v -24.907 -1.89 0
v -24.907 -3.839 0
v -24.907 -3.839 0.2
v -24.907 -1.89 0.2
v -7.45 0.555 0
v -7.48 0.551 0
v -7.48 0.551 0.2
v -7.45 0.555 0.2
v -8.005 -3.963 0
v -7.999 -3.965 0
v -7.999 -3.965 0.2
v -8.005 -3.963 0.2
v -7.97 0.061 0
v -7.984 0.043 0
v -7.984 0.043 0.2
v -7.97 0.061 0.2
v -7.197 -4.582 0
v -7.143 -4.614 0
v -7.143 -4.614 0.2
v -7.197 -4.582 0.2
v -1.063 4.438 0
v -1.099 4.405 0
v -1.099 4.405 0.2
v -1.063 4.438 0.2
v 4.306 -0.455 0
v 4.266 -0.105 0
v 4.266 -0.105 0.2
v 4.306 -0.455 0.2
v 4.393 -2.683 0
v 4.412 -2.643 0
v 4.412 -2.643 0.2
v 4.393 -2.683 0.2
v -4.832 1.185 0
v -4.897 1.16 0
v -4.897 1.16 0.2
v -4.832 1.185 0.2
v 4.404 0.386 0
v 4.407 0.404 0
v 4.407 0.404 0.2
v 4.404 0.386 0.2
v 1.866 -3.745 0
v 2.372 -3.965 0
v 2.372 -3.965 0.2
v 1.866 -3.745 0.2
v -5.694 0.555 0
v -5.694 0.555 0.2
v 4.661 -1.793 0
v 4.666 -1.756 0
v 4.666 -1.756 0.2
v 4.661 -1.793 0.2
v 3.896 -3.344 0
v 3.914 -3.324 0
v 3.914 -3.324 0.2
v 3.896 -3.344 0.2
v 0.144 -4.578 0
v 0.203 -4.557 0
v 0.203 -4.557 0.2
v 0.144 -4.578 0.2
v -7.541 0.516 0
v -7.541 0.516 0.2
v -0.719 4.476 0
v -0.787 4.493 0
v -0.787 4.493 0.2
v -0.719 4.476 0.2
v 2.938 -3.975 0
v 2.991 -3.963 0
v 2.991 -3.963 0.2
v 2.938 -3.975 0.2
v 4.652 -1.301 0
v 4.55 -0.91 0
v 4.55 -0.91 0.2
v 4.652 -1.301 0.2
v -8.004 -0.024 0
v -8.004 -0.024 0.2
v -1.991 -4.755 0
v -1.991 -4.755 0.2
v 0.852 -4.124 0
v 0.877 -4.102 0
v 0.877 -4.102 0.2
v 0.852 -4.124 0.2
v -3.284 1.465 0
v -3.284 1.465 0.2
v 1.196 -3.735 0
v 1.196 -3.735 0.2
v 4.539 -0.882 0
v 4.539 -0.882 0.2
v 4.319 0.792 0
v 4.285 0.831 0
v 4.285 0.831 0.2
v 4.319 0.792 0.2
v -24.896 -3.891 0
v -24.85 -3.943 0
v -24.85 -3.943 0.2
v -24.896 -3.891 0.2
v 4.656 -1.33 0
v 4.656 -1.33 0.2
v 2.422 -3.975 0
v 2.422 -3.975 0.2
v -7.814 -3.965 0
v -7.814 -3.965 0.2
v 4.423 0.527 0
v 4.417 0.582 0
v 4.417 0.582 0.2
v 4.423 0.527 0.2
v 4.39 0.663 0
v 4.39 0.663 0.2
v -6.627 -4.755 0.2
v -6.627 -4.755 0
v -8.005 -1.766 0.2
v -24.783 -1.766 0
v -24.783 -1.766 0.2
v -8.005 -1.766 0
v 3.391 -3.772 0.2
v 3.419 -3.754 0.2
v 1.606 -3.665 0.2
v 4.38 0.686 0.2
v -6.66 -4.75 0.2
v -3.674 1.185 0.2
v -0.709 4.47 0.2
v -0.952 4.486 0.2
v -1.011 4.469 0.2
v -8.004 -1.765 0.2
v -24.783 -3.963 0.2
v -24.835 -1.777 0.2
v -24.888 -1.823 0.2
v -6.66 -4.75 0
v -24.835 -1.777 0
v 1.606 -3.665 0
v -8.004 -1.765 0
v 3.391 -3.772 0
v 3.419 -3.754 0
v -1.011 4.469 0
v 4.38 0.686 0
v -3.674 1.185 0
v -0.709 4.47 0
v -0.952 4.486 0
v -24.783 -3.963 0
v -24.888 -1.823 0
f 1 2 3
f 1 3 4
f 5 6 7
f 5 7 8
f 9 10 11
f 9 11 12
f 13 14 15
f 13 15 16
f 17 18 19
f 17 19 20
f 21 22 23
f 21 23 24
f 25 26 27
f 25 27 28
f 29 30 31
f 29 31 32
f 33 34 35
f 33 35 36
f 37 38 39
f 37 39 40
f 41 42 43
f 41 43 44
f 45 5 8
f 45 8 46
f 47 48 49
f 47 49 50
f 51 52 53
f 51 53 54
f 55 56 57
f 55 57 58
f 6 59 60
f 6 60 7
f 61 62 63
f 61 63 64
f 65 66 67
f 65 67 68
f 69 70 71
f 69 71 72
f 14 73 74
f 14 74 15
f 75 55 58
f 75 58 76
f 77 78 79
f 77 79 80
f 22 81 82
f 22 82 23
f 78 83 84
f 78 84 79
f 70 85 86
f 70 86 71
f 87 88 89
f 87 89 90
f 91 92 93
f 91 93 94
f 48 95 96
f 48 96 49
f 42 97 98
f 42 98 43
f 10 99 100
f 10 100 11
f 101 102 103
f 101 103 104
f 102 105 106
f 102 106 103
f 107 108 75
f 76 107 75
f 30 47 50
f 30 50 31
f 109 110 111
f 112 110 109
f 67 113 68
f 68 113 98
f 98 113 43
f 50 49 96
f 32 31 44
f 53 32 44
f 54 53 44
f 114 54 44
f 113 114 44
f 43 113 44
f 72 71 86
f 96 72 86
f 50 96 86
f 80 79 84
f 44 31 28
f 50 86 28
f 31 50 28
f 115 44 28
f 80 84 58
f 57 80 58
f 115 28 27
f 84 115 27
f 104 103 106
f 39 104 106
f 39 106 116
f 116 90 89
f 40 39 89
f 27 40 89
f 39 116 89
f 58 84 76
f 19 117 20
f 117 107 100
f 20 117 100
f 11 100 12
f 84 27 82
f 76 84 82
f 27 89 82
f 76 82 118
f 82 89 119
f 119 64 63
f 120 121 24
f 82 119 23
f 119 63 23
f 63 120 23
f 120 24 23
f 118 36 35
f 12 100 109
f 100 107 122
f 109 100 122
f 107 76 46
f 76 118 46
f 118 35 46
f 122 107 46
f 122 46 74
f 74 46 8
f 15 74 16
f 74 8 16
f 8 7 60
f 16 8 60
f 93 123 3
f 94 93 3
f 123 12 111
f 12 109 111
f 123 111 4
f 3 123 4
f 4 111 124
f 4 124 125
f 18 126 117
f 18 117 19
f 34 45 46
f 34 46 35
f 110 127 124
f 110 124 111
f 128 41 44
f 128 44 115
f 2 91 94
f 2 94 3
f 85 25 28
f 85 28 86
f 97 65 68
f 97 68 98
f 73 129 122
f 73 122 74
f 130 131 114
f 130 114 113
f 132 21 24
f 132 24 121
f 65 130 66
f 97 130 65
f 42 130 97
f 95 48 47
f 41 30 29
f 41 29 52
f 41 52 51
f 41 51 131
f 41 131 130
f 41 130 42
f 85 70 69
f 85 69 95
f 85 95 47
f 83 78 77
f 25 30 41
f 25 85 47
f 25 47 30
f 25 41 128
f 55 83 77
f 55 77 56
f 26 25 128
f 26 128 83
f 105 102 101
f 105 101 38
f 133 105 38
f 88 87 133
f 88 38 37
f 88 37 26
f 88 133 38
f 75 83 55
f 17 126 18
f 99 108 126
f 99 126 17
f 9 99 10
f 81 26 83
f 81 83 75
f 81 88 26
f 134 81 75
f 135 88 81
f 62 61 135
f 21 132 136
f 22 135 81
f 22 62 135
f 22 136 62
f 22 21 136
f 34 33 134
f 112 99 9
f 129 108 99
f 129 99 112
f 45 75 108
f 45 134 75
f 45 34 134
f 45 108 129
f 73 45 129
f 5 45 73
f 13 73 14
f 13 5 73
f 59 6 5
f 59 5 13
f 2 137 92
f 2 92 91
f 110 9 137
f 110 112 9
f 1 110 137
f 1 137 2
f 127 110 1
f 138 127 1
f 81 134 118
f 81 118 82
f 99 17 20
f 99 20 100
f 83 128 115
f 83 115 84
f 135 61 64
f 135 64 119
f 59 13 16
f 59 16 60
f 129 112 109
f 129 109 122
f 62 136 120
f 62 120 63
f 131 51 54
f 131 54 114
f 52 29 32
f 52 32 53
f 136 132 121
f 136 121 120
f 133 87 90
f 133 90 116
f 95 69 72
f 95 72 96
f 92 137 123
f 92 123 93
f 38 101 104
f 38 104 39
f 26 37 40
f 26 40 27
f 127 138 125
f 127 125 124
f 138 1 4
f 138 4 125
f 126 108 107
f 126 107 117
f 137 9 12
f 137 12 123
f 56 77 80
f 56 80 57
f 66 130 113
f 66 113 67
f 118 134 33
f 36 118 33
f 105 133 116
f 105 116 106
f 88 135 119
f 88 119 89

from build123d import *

# Parameters (mm, degrees)
BOSS_EXTRUDE1_DEPTH   = 0.2
BOSS_EXTRUDE1_2_DEPTH = 0.2


with BuildPart() as part:
    # Model → Boss-Extrude1 (new body)
    with BuildSketch(Plane.XY):
        Polygon((-0.719000633, 4.476263641), (-0.709000633, 4.470263641), (4.284999367, 0.831263641), (4.318999367, 0.792263641), (4.379999367, 0.686263641), (4.389999367, 0.663263641), (4.416999367, 0.582263641), (4.422999367, 0.527263641), (4.406999367, 0.404263641), (4.403999367, 0.386263641), (4.265999367, -0.104736359), (4.305999367, -0.454736359), (4.538999367, -0.881736359), (4.549999367, -0.909736359), (4.651999367, -1.300736359), (4.655999367, -1.329736359), (4.665999367, -1.755736359), (4.660999367, -1.792736359), (4.411999367, -2.642736359), (4.392999367, -2.682736359), (3.913999367, -3.323736359), (3.895999367, -3.343736359), (3.418999367, -3.753736359), (3.390999367, -3.771736359), (2.990999367, -3.962736359), (2.937999367, -3.974736359), (2.421999367, -3.974736359), (2.371999367, -3.964736359), (1.865999367, -3.744736359), (1.605999367, -3.664736359), (1.195999367, -3.734736359), (0.876999367, -4.101736359), (0.851999367, -4.123736359), (0.202999367, -4.556736359), (0.143999367, -4.577736359), (-1.991000633, -4.754736359), (-1.997000633, -4.754736359), (-6.627000633, -4.754736359), (-6.660000633, -4.749736359), (-7.143000633, -4.613736359), (-7.197000633, -4.581736359), (-7.814000633, -3.964736359), (-7.999000633, -3.964736359), (-8.005000633, -3.962736359), (-24.783000633, -3.962736359), (-24.850000633, -3.942736359), (-24.896000633, -3.890736359), (-24.907000633, -3.838736359), (-24.907000633, -1.889736359), (-24.888000633, -1.822736359), (-24.835000633, -1.776736359), (-24.783000633, -1.765736359), (-8.005000633, -1.765736359), (-8.004000633, -1.764736359), (-8.004000633, -0.023736359), (-7.984000633, 0.043263641), (-7.970000633, 0.061263641), (-7.541000633, 0.516263641), (-7.480000633, 0.551263641), (-7.450000633, 0.555263641), (-5.694000633, 0.555263641), (-4.897000633, 1.160263641), (-4.832000633, 1.185263641), (-4.822000633, 1.185263641), (-3.674000633, 1.185263641), (-3.284000633, 1.465263641), (-1.099000633, 4.405263641), (-1.063000633, 4.438263641), (-1.011000633, 4.469263641), (-0.952000633, 4.486263641), (-0.787000633, 4.493263641), align=None)
    extrude(amount=BOSS_EXTRUDE1_DEPTH)


with BuildPart() as body_2:
    # Model → Boss-Extrude1 2 (new body)
    with BuildSketch(Plane.XY):
        Polygon((-12.208000633, 15.583263641), (-12.129000633, 15.567263641), (-12.085000633, 15.549263641), (-12.028000633, 15.511263641), (-11.994000633, 15.477263641), (-11.957000633, 15.420263641), (-11.938000633, 15.376263641), (-11.922000633, 15.297263641), (-11.920000633, 15.273263641), (-11.920000633, 14.001263641), (-11.922000633, 13.977263641), (-11.938000633, 13.898263641), (-11.957000633, 13.854263641), (-11.994000633, 13.797263641), (-12.028000633, 13.763263641), (-12.085000633, 13.725263641), (-12.129000633, 13.707263641), (-12.208000633, 13.691263641), (-12.232000633, 13.689263641), (-12.403000633, 13.689263641), (-12.518000633, 13.666263641), (-12.615000633, 13.601263641), (-12.680000633, 13.504263641), (-12.703000633, 13.389263641), (-12.703000633, 10.112263641), (-12.705000633, 10.088263641), (-12.721000633, 10.009263641), (-12.739000633, 9.964263641), (-12.777000633, 9.908263641), (-12.811000633, 9.874263641), (-12.868000633, 9.836263641), (-12.912000633, 9.818263641), (-12.991000633, 9.802263641), (-13.015000633, 9.800263641), (-14.285000633, 9.800263641), (-14.361000633, 9.784263641), (-14.426000633, 9.741263641), (-14.470000633, 9.676263641), (-14.485000633, 9.600263641), (-14.485000633, 9.081263641), (-14.487000633, 9.057263641), (-14.495000633, 9.017263641), (-14.514000633, 8.972263641), (-14.530000633, 8.948263641), (-14.564000633, 8.914263641), (-14.566000633, 8.913263641), (-14.632000633, 8.892263641), (-14.635000633, 8.892263641), (-18.652000633, 8.895263641), (-18.720000633, 8.914263641), (-18.755000633, 8.950263641), (-18.770000633, 8.972263641), (-18.789000633, 9.017263641), (-18.797000633, 9.057263641), (-18.799000633, 9.081263641), (-18.799000633, 9.600263641), (-18.815000633, 9.676263641), (-18.858000633, 9.741263641), (-18.923000633, 9.784263641), (-18.999000633, 9.800263641), (-19.007000633, 9.800263641), (-19.021000633, 9.804263641), (-21.430000633, 9.804263641), (-21.497000633, 9.823263641), (-21.543000633, 9.876263641), (-21.554000633, 9.928263641), (-21.554000633, 9.985263641), (-21.577000633, 10.100263641), (-21.642000633, 10.197263641), (-21.739000633, 10.262263641), (-21.854000633, 10.285263641), (-22.082000633, 10.285263641), (-22.106000633, 10.287263641), (-22.146000633, 10.296263641), (-22.191000633, 10.314263641), (-22.215000633, 10.330263641), (-22.249000633, 10.364263641), (-22.265000633, 10.388263641), (-22.284000633, 10.433263641), (-22.292000633, 10.473263641), (-22.294000633, 10.497263641), (-22.294000633, 12.473263641), (-22.292000633, 12.497263641), (-22.284000633, 12.537263641), (-22.265000633, 12.582263641), (-22.249000633, 12.606263641), (-22.215000633, 12.640263641), (-22.191000633, 12.656263641), (-22.146000633, 12.675263641), (-22.106000633, 12.683263641), (-22.082000633, 12.685263641), (-21.854000633, 12.685263641), (-21.739000633, 12.708263641), (-21.642000633, 12.773263641), (-21.577000633, 12.870263641), (-21.554000633, 12.985263641), (-21.554000633, 15.273263641), (-21.552000633, 15.297263641), (-21.536000633, 15.376263641), (-21.517000633, 15.420263641), (-21.480000633, 15.477263641), (-21.446000633, 15.511263641), (-21.389000633, 15.549263641), (-21.345000633, 15.567263641), (-21.266000633, 15.583263641), (-21.242000633, 15.585263641), (-12.232000633, 15.585263641), align=None)
    extrude(amount=BOSS_EXTRUDE1_2_DEPTH)


solid = part.part
